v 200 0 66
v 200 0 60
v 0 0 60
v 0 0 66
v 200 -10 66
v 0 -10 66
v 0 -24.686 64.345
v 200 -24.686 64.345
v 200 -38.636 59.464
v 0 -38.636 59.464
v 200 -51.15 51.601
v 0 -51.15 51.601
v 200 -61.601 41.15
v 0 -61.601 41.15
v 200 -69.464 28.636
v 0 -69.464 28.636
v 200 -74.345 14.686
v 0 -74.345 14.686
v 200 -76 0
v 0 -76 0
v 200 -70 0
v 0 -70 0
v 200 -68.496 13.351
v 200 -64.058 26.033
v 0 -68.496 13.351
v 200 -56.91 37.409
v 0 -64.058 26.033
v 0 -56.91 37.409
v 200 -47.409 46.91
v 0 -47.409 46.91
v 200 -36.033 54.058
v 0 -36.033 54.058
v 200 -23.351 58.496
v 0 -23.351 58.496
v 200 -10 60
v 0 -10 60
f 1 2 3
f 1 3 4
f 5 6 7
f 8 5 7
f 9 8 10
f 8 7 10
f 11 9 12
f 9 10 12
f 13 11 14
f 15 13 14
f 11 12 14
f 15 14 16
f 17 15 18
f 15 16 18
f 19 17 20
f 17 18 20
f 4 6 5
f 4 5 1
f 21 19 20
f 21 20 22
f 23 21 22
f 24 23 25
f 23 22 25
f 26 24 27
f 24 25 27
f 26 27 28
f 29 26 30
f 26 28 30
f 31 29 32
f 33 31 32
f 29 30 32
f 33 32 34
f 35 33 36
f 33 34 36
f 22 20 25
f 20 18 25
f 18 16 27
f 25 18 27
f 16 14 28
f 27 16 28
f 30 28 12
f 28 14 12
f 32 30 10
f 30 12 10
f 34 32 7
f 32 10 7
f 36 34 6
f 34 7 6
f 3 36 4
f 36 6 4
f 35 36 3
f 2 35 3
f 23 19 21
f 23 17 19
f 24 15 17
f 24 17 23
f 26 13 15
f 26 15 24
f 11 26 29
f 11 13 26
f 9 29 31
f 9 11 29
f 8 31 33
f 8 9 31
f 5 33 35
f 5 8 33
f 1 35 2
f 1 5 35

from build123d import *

# Parameters (mm, degrees)
F0_W     = 10
F0_H     = 6
F1_DEPTH = 200


with BuildPart() as f1:
    # F0 (on Right) → F1 (new body)
    with BuildSketch(Plane.YZ):
        with BuildLine():
            Line((-76, 0), (-70, 0))
            ThreePointArc((-70, 0), (-52.426407, 42.426407), (-10, 60))
            Line((-10, 60), (-10, 66))
            ThreePointArc((-10, 66), (-56.669048, 46.669048), (-76, 0))
        make_face()
        with Locations((-5, 63)):
            Rectangle(F0_W, F0_H)
    extrude(amount=F1_DEPTH)


solid = f1.part
